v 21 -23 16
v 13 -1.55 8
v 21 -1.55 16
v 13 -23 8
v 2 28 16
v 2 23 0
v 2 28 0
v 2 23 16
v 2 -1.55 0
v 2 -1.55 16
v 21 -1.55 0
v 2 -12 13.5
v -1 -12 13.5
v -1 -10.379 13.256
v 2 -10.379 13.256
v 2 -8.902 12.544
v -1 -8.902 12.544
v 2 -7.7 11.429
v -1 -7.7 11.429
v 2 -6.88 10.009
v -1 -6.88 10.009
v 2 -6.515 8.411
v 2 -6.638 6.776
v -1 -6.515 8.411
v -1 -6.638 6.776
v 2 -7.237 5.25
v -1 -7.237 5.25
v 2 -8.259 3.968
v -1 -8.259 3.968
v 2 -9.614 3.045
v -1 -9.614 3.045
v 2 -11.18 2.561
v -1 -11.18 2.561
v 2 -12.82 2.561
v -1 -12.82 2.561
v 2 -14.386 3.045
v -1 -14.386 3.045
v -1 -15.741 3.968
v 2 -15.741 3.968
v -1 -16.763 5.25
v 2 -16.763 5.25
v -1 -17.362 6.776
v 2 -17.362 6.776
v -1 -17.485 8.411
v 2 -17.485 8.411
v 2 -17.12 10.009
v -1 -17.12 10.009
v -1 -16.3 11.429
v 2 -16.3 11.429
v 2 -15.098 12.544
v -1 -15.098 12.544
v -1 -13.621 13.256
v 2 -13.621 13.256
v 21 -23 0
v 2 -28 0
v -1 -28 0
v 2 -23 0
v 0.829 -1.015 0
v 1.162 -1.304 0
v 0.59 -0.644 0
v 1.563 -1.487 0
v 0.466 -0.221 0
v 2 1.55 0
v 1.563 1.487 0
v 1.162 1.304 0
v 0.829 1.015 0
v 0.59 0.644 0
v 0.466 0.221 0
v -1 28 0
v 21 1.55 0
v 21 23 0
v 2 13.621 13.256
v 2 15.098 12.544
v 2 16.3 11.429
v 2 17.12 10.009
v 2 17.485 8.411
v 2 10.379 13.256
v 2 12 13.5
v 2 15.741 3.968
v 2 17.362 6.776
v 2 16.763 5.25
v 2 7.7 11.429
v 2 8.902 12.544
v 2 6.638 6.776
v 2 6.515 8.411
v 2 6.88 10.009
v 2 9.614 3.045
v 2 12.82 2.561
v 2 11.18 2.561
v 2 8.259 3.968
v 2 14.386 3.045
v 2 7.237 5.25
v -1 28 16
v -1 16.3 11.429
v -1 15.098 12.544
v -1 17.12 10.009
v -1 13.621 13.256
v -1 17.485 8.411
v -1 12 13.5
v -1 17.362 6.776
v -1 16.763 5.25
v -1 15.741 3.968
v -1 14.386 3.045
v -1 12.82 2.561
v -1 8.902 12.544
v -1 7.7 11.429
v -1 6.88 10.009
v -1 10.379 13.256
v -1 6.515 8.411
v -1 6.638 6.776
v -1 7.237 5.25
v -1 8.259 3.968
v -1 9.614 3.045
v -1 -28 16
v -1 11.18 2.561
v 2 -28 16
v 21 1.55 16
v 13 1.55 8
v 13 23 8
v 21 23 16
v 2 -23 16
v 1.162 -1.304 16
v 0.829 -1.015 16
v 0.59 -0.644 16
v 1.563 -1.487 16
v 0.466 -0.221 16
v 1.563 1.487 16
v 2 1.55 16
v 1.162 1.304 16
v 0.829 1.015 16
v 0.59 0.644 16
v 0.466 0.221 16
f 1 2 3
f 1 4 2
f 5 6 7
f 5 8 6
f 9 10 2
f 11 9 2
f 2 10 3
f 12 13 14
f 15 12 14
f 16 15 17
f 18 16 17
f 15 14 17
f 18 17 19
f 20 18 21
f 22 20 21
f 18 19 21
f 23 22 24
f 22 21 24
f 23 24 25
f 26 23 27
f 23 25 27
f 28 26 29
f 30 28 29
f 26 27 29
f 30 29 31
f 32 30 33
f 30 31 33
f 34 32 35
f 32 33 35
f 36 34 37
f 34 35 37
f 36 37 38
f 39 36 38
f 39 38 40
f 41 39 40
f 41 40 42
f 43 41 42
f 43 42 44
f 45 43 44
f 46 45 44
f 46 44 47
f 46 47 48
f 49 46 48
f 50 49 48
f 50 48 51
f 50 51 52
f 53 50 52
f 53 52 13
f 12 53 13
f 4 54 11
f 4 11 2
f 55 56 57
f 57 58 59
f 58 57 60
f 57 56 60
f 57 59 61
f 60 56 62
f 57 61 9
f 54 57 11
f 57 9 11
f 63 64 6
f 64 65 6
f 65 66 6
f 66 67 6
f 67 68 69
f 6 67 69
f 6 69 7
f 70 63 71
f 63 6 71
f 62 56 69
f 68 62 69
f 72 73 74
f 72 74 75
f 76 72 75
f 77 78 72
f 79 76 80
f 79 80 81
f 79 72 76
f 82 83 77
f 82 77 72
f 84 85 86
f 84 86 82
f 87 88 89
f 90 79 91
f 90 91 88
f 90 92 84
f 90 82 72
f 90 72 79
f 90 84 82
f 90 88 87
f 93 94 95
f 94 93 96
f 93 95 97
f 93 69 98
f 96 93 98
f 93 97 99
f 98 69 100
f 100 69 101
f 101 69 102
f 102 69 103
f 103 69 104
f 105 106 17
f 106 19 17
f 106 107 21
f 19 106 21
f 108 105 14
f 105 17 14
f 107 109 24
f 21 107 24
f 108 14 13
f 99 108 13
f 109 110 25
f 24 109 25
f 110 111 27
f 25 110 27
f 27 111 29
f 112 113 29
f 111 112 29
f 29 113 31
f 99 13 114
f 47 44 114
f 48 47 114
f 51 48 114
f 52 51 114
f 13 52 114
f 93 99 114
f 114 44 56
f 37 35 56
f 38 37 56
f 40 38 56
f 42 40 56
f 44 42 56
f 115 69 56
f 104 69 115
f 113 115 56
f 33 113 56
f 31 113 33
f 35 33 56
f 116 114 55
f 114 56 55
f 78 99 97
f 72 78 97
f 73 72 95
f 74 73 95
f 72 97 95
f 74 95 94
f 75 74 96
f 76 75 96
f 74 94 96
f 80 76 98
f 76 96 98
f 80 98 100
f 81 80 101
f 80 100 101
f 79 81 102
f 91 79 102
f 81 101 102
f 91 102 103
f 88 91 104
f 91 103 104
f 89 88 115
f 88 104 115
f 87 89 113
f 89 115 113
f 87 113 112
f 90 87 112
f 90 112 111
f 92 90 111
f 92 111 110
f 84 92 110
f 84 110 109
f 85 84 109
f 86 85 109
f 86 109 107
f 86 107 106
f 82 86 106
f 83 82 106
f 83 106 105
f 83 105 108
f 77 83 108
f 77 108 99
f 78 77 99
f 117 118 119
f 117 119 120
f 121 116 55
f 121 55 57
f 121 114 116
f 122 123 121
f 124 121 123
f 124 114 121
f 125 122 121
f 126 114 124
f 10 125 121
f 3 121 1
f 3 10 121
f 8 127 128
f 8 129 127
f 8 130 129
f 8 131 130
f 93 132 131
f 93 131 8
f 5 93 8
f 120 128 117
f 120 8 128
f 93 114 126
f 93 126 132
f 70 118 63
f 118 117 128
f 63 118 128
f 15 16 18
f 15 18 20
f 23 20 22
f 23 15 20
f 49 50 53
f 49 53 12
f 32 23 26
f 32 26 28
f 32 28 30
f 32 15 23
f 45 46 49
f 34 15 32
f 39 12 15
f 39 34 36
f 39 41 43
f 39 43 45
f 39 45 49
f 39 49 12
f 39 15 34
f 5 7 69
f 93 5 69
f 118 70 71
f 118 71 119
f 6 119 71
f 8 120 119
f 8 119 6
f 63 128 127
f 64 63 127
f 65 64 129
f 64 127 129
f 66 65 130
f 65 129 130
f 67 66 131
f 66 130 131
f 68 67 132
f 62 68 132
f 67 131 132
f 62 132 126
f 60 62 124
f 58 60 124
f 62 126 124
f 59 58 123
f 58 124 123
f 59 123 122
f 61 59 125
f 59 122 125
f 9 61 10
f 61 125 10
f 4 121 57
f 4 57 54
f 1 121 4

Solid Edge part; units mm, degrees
sketch "Sketch1" plane through (0, 0, 0) normal (0, 0, 1) x (1, 0, 0)
  line L0 (-1, -28) -> (1, -28)
  line L1 (1, -28) -> (1, 28)
  line L2 (1, 28) -> (-1, 28)
  line L3 (-1, 28) -> (-1, -28)
  dimension "D1" = 56
  dimension "D2" = 2
extrude "Protrusion1" add sketch "Sketch1" along normal blind 16
sketch "Sketch2" plane through (0, -28, 8) normal (0, -1, 0) x (0, 0, 1)
  line L0 (-8, -1) -> (-8, -21)
  line L1 (-8, -21) -> (0, -13)
  line L2 (0, -13) -> (8, -21)
  line L3 (8, -21) -> (8, -1)
  dimension "D1" = 20
extrude "Protrusion2" add sketch "Sketch2" against normal up to vertex (56 mm away) material side at (11, -28, 0.05)
sketch "Sketch3" plane through (5, 0, 16) normal (0, 0, 1) x (0, -1, 0)
  line L0 (1.55, 16) -> (-1.55, 16)
  line L1 (-1.55, 16) -> (-1.55, -3)
  line L2 (-1.55, -3) -> (1.55, -3)
  line L3 (1.55, -3) -> (1.55, 16)
  dimension "D1" = 3
  dimension "D2" = 3.1
extrude "Cutout1" cut sketch "Sketch3" against normal through all
sketch "Sketch4" plane through (5, 0, 16) normal (0, 0, 1) x (0, -1, 0)
  line L0 (-28, 16) -> (-23, 16)
  line L1 (-23, 16) -> (-23, -3)
  line L2 (-23, -3) -> (-28, -3)
  line L3 (-28, -3) -> (-28, 16)
  dimension "D1" = 3
  dimension "D2" = 23
extrude "Cutout2" cut sketch "Sketch4" against normal through all
mirror "Mirror1" about plane through (0, 0, 0) normal (0, -1, 0) of "Cutout2"
sketch "Sketch5" plane through (5, 0, 16) normal (0, 0, 1) x (0, -1, 0)
  arc A0 (-1.55, -3) -> (1.55, -3) centre (0, -3) ccw
extrude "Cutout3" cut sketch "Sketch5" against normal through all material side at (0.5, 0, 16)
sketch "Sketch6" plane through (-1, 0, 8) normal (-1, 0, 0) x (0, 0, 1)
  circle A0 centre (0, 12) radius 5.5
  circle A1 centre (0, -12) radius 5.5
  dimension "D1" = 11
  dimension "D2" = 12
  dimension "D3" = 24
  dimension "D4" = 11
extrude "Extrusionsausschnitt_4" cut sketch "Sketch6" against normal blind 3
properties material "Nylon, allgemein"
